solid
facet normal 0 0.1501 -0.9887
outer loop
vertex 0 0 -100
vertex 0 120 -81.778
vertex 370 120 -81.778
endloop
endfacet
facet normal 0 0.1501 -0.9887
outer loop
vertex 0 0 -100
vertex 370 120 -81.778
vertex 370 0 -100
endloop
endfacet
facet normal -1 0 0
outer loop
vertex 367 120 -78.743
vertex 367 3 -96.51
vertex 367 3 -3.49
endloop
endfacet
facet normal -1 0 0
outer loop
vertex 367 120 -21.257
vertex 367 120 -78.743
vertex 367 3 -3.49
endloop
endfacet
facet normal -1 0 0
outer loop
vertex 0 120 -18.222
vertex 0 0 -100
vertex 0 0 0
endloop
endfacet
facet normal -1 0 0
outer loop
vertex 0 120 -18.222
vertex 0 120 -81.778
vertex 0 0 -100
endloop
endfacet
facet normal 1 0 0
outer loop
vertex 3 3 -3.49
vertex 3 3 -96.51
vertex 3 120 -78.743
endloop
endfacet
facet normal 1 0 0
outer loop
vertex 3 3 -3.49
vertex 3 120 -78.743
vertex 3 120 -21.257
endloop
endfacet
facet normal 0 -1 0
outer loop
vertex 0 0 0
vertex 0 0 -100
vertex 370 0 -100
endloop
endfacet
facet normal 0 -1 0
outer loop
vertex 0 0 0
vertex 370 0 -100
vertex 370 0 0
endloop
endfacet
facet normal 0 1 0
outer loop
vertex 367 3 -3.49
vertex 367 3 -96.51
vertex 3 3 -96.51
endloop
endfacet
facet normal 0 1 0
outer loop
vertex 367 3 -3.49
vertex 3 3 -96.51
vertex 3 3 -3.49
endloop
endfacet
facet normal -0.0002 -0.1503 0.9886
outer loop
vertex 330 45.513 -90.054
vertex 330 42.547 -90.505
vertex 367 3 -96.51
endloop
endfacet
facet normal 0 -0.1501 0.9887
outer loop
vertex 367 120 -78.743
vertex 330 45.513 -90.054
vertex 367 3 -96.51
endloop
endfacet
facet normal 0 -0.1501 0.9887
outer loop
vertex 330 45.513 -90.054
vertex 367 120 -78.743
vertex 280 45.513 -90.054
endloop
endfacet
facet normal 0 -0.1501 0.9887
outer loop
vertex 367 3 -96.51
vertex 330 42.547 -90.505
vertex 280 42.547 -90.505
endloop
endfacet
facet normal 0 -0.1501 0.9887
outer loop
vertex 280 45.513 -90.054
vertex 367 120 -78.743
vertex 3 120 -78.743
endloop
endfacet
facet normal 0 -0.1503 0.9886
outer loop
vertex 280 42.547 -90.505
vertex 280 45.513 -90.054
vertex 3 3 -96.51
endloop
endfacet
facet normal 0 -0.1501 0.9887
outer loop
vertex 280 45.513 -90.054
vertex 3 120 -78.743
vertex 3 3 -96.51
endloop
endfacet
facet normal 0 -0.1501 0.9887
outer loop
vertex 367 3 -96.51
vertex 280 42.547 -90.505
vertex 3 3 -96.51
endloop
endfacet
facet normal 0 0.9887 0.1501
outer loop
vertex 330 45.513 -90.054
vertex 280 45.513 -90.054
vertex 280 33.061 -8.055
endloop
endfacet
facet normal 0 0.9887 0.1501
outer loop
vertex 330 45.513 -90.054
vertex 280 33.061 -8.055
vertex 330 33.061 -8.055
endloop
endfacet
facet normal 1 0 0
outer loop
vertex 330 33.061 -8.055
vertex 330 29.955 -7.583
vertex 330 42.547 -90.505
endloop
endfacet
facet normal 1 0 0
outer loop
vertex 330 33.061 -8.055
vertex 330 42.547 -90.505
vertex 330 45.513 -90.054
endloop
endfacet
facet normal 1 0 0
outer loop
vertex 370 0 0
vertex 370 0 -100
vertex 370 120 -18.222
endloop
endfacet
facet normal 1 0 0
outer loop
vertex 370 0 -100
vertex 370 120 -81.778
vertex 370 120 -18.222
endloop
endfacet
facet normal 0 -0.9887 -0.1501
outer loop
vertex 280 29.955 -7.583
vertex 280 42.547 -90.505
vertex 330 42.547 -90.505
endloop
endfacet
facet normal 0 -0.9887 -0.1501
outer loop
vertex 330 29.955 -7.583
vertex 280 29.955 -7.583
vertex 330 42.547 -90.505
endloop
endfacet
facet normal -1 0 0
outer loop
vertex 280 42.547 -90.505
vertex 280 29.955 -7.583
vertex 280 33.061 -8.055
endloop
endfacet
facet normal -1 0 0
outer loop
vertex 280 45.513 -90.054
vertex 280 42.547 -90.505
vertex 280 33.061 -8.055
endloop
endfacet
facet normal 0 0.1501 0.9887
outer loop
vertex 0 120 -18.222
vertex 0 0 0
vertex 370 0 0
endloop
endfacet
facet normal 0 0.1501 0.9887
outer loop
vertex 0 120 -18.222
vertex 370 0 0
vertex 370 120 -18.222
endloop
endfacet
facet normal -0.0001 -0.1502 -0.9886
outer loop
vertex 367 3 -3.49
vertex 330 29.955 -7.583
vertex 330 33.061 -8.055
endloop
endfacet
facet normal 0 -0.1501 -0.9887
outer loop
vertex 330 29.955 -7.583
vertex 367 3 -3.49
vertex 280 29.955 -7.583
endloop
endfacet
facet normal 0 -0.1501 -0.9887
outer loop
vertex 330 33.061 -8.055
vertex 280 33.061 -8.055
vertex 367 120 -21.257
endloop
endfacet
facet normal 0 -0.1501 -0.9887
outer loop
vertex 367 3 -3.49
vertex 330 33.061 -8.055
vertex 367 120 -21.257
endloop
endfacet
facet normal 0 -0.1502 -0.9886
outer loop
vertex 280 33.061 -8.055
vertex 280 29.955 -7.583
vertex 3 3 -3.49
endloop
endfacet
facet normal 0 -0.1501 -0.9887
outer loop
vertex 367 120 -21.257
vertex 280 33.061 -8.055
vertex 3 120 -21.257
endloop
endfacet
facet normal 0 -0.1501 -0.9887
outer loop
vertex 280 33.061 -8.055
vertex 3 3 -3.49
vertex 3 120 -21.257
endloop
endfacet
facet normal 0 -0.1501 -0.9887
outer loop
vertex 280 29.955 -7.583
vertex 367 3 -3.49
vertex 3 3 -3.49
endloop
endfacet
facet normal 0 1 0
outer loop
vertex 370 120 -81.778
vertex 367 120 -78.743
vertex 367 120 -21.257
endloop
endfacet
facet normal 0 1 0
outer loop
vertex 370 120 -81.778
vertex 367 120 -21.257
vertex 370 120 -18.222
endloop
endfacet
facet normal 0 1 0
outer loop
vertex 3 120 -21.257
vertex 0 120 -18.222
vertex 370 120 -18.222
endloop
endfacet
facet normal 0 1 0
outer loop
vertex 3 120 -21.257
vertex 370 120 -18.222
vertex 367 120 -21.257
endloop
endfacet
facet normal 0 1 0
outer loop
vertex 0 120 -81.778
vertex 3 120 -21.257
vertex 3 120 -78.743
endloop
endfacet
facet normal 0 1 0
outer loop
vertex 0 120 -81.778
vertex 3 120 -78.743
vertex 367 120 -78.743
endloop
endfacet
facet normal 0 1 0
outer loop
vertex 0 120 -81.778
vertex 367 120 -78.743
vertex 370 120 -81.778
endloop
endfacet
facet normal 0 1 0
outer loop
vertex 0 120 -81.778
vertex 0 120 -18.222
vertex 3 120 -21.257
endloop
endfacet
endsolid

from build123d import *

# Parameters (mm, degrees)
BOSS_EXTRUDE1_DEPTH = 370
SHELL1_T            = -3
BOSS_EXTRUDE2_REACH = 398.278
SKETCH3_W           = 50
SKETCH3_H           = 3


with BuildPart() as part:
    # Sketch2 → Boss-Extrude1 (new body)
    with BuildSketch(Plane(origin=(0, 0, 0), x_dir=(0, 0, -1), z_dir=(1, 0, 0))):
        Polygon((100, 0), (0, 0), (18.222222222, 120), (81.777777778, 120), align=None)
    extrude(amount=BOSS_EXTRUDE1_DEPTH)

    # Shell1
    shell1_openings = [part.faces().sort_by_distance(p)[0] for p in [
        (185, 120, -50),
    ]]
    offset(amount=SHELL1_T, openings=shell1_openings, kind=Kind.INTERSECTION)

    # Boss-Extrude2: up to this plane
    boss_extrude2_end = Plane(origin=(370, 119.549607645, -21.188220659), z_dir=(0, -0.15013078506635866, -0.9886661455594395))
    # Sketch3 → Boss-Extrude2 (add, up to the surface)
    with BuildSketch(Plane(origin=(0, 14.392530105, -94.780076301), x_dir=(1, 0, 0), z_dir=(0, -0.1501307850664947, 0.988666145559419)), mode=Mode.PRIVATE) as boss_extrude2_sk1:
        with Locations((305, 29.976868399)):
            Rectangle(SKETCH3_W, SKETCH3_H)
    boss_extrude2_tool1 = split(extrude(boss_extrude2_sk1.sketch, amount=BOSS_EXTRUDE2_REACH, mode=Mode.PRIVATE), bisect_by=boss_extrude2_end, keep=Keep.BOTH, mode=Mode.PRIVATE)
    add(boss_extrude2_tool1.solids().sort_by_distance((305, 44.029645, -90.279626))[0])


solid = part.part
